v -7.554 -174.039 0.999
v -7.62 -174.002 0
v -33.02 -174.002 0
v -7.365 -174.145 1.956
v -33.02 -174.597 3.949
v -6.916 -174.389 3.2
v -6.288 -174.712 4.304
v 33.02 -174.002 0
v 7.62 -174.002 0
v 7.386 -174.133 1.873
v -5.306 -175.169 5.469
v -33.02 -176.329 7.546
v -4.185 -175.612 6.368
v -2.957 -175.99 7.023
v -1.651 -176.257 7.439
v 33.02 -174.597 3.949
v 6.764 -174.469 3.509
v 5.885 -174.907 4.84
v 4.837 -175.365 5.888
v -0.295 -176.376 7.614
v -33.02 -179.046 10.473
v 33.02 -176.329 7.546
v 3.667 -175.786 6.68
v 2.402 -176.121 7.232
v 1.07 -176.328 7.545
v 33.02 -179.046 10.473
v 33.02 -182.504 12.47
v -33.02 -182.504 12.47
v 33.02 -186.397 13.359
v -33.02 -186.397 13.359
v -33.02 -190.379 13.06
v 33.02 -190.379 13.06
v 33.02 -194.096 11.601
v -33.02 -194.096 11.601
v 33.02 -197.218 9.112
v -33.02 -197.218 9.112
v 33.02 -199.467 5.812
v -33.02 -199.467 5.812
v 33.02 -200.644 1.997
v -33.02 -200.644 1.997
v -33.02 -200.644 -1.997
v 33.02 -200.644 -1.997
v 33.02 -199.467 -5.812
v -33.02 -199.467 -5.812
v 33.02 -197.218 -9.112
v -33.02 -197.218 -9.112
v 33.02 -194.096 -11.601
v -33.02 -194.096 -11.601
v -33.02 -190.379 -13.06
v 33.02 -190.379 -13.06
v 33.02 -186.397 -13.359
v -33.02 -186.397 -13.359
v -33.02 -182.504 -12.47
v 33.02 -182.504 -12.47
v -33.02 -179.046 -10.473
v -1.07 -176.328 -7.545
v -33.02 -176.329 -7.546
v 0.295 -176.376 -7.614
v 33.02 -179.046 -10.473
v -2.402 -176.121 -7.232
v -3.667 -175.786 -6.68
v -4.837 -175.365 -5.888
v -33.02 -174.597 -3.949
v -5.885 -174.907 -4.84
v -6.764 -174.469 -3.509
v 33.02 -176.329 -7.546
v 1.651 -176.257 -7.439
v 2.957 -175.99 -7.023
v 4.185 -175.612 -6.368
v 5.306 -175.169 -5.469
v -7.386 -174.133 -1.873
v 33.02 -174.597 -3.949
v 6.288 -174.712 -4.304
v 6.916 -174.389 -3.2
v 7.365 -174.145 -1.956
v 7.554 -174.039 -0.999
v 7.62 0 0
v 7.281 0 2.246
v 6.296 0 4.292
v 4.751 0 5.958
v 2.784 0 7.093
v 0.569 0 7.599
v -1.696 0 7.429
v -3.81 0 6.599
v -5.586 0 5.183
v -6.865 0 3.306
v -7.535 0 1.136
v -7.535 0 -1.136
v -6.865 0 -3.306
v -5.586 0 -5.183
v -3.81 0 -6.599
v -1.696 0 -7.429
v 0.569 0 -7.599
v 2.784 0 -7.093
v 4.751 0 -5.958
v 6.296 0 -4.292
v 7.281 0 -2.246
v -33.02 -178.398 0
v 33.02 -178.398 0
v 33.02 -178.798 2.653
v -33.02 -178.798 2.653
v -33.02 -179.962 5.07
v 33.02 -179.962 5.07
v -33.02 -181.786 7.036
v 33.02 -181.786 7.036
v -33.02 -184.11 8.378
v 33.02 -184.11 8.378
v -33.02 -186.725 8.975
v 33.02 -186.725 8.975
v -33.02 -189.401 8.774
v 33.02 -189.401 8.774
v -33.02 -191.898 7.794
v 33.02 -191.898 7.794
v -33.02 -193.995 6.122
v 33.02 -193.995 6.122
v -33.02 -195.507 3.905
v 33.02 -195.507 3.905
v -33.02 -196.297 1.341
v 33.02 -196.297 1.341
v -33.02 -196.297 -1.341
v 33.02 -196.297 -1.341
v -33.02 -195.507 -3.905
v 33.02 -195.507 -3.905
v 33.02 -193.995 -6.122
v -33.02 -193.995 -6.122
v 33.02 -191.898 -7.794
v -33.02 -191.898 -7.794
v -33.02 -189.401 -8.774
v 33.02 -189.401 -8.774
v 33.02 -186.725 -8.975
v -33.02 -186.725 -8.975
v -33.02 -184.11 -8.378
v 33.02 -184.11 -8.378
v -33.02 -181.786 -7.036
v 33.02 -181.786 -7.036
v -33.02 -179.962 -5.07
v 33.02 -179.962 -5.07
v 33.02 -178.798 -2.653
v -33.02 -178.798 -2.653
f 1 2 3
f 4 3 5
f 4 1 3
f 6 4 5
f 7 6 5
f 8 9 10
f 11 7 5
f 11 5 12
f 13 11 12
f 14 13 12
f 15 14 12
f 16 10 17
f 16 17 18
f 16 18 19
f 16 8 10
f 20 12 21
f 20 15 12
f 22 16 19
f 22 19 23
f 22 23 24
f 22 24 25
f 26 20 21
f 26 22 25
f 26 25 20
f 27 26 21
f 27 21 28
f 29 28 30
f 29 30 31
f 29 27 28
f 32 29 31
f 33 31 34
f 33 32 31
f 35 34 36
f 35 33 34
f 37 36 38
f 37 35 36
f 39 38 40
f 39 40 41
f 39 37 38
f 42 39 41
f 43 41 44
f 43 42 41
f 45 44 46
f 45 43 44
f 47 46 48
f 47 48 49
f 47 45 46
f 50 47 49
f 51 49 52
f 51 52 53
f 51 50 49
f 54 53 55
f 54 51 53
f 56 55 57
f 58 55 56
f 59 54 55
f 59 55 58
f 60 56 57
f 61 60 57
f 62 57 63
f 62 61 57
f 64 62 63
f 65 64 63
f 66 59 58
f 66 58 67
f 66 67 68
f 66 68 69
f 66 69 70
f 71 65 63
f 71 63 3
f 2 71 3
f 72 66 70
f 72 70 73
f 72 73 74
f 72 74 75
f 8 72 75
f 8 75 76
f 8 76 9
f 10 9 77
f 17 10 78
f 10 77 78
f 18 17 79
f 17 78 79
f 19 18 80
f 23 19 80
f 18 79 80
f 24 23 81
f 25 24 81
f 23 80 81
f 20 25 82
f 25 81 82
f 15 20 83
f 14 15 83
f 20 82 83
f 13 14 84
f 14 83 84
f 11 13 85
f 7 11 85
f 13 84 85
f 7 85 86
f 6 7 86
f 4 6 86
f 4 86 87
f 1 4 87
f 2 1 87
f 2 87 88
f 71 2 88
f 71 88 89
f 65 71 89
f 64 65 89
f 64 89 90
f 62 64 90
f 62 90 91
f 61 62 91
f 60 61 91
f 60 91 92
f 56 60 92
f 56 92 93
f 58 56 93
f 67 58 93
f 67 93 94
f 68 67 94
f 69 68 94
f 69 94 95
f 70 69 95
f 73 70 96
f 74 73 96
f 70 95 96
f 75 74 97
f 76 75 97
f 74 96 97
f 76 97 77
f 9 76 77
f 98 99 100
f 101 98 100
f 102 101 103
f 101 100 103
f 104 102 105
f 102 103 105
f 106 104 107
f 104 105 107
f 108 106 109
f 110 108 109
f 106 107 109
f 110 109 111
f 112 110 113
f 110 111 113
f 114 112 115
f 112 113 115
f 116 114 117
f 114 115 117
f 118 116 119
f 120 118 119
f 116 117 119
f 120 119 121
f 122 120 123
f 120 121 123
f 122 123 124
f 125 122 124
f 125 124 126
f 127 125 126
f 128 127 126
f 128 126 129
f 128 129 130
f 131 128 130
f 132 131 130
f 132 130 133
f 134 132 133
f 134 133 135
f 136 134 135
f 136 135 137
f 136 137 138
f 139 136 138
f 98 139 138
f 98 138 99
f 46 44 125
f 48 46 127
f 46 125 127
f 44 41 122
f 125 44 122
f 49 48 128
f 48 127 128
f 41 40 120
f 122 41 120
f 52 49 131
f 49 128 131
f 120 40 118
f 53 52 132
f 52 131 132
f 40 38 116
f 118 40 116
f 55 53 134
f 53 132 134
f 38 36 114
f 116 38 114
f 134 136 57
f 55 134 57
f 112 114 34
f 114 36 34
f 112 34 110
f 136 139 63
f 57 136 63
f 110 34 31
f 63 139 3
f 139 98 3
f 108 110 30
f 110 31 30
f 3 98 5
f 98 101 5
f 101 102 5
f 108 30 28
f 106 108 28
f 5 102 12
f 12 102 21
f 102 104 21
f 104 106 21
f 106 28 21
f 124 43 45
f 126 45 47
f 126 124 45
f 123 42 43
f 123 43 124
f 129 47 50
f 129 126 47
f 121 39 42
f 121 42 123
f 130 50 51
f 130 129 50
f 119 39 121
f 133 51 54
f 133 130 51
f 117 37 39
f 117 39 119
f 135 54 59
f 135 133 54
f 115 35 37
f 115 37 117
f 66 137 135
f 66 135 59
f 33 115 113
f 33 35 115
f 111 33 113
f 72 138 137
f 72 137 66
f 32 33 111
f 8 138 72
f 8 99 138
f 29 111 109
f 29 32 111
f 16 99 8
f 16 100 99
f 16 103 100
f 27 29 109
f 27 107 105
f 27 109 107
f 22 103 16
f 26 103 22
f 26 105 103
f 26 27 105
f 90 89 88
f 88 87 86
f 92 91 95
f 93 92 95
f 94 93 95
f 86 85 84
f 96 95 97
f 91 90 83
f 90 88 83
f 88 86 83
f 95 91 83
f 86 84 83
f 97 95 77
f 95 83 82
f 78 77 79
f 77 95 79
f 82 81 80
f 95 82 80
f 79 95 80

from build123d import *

# Parameters (mm, degrees)
F0_R     = 7.62
F1_DEPTH = 177.8
F2_R     = 13.3961088479
F3_DEPTH = 33.02
F4_R     = 8.9999575192
F5_DEPTH = 83.312


with BuildPart() as f1:
    # F0 (on Front) → F1 (new body)
    with BuildSketch(Plane.XZ):
        Circle(F0_R)
    extrude(amount=F1_DEPTH)

    # F2 (on Right) → F3 (join, symmetric)
    with BuildSketch(Plane.YZ):
        with Locations((-187.3978376389, 0)):
            Circle(F2_R)
    extrude(amount=F3_DEPTH, both=True)

    # F4 (on face) → F5 (cut)
    with BuildSketch(Plane.YZ.offset(33.02)):
        with Locations((-187.3978376389, 0)):
            Circle(F4_R)
    extrude(amount=-F5_DEPTH, mode=Mode.SUBTRACT)


solid = f1.part
